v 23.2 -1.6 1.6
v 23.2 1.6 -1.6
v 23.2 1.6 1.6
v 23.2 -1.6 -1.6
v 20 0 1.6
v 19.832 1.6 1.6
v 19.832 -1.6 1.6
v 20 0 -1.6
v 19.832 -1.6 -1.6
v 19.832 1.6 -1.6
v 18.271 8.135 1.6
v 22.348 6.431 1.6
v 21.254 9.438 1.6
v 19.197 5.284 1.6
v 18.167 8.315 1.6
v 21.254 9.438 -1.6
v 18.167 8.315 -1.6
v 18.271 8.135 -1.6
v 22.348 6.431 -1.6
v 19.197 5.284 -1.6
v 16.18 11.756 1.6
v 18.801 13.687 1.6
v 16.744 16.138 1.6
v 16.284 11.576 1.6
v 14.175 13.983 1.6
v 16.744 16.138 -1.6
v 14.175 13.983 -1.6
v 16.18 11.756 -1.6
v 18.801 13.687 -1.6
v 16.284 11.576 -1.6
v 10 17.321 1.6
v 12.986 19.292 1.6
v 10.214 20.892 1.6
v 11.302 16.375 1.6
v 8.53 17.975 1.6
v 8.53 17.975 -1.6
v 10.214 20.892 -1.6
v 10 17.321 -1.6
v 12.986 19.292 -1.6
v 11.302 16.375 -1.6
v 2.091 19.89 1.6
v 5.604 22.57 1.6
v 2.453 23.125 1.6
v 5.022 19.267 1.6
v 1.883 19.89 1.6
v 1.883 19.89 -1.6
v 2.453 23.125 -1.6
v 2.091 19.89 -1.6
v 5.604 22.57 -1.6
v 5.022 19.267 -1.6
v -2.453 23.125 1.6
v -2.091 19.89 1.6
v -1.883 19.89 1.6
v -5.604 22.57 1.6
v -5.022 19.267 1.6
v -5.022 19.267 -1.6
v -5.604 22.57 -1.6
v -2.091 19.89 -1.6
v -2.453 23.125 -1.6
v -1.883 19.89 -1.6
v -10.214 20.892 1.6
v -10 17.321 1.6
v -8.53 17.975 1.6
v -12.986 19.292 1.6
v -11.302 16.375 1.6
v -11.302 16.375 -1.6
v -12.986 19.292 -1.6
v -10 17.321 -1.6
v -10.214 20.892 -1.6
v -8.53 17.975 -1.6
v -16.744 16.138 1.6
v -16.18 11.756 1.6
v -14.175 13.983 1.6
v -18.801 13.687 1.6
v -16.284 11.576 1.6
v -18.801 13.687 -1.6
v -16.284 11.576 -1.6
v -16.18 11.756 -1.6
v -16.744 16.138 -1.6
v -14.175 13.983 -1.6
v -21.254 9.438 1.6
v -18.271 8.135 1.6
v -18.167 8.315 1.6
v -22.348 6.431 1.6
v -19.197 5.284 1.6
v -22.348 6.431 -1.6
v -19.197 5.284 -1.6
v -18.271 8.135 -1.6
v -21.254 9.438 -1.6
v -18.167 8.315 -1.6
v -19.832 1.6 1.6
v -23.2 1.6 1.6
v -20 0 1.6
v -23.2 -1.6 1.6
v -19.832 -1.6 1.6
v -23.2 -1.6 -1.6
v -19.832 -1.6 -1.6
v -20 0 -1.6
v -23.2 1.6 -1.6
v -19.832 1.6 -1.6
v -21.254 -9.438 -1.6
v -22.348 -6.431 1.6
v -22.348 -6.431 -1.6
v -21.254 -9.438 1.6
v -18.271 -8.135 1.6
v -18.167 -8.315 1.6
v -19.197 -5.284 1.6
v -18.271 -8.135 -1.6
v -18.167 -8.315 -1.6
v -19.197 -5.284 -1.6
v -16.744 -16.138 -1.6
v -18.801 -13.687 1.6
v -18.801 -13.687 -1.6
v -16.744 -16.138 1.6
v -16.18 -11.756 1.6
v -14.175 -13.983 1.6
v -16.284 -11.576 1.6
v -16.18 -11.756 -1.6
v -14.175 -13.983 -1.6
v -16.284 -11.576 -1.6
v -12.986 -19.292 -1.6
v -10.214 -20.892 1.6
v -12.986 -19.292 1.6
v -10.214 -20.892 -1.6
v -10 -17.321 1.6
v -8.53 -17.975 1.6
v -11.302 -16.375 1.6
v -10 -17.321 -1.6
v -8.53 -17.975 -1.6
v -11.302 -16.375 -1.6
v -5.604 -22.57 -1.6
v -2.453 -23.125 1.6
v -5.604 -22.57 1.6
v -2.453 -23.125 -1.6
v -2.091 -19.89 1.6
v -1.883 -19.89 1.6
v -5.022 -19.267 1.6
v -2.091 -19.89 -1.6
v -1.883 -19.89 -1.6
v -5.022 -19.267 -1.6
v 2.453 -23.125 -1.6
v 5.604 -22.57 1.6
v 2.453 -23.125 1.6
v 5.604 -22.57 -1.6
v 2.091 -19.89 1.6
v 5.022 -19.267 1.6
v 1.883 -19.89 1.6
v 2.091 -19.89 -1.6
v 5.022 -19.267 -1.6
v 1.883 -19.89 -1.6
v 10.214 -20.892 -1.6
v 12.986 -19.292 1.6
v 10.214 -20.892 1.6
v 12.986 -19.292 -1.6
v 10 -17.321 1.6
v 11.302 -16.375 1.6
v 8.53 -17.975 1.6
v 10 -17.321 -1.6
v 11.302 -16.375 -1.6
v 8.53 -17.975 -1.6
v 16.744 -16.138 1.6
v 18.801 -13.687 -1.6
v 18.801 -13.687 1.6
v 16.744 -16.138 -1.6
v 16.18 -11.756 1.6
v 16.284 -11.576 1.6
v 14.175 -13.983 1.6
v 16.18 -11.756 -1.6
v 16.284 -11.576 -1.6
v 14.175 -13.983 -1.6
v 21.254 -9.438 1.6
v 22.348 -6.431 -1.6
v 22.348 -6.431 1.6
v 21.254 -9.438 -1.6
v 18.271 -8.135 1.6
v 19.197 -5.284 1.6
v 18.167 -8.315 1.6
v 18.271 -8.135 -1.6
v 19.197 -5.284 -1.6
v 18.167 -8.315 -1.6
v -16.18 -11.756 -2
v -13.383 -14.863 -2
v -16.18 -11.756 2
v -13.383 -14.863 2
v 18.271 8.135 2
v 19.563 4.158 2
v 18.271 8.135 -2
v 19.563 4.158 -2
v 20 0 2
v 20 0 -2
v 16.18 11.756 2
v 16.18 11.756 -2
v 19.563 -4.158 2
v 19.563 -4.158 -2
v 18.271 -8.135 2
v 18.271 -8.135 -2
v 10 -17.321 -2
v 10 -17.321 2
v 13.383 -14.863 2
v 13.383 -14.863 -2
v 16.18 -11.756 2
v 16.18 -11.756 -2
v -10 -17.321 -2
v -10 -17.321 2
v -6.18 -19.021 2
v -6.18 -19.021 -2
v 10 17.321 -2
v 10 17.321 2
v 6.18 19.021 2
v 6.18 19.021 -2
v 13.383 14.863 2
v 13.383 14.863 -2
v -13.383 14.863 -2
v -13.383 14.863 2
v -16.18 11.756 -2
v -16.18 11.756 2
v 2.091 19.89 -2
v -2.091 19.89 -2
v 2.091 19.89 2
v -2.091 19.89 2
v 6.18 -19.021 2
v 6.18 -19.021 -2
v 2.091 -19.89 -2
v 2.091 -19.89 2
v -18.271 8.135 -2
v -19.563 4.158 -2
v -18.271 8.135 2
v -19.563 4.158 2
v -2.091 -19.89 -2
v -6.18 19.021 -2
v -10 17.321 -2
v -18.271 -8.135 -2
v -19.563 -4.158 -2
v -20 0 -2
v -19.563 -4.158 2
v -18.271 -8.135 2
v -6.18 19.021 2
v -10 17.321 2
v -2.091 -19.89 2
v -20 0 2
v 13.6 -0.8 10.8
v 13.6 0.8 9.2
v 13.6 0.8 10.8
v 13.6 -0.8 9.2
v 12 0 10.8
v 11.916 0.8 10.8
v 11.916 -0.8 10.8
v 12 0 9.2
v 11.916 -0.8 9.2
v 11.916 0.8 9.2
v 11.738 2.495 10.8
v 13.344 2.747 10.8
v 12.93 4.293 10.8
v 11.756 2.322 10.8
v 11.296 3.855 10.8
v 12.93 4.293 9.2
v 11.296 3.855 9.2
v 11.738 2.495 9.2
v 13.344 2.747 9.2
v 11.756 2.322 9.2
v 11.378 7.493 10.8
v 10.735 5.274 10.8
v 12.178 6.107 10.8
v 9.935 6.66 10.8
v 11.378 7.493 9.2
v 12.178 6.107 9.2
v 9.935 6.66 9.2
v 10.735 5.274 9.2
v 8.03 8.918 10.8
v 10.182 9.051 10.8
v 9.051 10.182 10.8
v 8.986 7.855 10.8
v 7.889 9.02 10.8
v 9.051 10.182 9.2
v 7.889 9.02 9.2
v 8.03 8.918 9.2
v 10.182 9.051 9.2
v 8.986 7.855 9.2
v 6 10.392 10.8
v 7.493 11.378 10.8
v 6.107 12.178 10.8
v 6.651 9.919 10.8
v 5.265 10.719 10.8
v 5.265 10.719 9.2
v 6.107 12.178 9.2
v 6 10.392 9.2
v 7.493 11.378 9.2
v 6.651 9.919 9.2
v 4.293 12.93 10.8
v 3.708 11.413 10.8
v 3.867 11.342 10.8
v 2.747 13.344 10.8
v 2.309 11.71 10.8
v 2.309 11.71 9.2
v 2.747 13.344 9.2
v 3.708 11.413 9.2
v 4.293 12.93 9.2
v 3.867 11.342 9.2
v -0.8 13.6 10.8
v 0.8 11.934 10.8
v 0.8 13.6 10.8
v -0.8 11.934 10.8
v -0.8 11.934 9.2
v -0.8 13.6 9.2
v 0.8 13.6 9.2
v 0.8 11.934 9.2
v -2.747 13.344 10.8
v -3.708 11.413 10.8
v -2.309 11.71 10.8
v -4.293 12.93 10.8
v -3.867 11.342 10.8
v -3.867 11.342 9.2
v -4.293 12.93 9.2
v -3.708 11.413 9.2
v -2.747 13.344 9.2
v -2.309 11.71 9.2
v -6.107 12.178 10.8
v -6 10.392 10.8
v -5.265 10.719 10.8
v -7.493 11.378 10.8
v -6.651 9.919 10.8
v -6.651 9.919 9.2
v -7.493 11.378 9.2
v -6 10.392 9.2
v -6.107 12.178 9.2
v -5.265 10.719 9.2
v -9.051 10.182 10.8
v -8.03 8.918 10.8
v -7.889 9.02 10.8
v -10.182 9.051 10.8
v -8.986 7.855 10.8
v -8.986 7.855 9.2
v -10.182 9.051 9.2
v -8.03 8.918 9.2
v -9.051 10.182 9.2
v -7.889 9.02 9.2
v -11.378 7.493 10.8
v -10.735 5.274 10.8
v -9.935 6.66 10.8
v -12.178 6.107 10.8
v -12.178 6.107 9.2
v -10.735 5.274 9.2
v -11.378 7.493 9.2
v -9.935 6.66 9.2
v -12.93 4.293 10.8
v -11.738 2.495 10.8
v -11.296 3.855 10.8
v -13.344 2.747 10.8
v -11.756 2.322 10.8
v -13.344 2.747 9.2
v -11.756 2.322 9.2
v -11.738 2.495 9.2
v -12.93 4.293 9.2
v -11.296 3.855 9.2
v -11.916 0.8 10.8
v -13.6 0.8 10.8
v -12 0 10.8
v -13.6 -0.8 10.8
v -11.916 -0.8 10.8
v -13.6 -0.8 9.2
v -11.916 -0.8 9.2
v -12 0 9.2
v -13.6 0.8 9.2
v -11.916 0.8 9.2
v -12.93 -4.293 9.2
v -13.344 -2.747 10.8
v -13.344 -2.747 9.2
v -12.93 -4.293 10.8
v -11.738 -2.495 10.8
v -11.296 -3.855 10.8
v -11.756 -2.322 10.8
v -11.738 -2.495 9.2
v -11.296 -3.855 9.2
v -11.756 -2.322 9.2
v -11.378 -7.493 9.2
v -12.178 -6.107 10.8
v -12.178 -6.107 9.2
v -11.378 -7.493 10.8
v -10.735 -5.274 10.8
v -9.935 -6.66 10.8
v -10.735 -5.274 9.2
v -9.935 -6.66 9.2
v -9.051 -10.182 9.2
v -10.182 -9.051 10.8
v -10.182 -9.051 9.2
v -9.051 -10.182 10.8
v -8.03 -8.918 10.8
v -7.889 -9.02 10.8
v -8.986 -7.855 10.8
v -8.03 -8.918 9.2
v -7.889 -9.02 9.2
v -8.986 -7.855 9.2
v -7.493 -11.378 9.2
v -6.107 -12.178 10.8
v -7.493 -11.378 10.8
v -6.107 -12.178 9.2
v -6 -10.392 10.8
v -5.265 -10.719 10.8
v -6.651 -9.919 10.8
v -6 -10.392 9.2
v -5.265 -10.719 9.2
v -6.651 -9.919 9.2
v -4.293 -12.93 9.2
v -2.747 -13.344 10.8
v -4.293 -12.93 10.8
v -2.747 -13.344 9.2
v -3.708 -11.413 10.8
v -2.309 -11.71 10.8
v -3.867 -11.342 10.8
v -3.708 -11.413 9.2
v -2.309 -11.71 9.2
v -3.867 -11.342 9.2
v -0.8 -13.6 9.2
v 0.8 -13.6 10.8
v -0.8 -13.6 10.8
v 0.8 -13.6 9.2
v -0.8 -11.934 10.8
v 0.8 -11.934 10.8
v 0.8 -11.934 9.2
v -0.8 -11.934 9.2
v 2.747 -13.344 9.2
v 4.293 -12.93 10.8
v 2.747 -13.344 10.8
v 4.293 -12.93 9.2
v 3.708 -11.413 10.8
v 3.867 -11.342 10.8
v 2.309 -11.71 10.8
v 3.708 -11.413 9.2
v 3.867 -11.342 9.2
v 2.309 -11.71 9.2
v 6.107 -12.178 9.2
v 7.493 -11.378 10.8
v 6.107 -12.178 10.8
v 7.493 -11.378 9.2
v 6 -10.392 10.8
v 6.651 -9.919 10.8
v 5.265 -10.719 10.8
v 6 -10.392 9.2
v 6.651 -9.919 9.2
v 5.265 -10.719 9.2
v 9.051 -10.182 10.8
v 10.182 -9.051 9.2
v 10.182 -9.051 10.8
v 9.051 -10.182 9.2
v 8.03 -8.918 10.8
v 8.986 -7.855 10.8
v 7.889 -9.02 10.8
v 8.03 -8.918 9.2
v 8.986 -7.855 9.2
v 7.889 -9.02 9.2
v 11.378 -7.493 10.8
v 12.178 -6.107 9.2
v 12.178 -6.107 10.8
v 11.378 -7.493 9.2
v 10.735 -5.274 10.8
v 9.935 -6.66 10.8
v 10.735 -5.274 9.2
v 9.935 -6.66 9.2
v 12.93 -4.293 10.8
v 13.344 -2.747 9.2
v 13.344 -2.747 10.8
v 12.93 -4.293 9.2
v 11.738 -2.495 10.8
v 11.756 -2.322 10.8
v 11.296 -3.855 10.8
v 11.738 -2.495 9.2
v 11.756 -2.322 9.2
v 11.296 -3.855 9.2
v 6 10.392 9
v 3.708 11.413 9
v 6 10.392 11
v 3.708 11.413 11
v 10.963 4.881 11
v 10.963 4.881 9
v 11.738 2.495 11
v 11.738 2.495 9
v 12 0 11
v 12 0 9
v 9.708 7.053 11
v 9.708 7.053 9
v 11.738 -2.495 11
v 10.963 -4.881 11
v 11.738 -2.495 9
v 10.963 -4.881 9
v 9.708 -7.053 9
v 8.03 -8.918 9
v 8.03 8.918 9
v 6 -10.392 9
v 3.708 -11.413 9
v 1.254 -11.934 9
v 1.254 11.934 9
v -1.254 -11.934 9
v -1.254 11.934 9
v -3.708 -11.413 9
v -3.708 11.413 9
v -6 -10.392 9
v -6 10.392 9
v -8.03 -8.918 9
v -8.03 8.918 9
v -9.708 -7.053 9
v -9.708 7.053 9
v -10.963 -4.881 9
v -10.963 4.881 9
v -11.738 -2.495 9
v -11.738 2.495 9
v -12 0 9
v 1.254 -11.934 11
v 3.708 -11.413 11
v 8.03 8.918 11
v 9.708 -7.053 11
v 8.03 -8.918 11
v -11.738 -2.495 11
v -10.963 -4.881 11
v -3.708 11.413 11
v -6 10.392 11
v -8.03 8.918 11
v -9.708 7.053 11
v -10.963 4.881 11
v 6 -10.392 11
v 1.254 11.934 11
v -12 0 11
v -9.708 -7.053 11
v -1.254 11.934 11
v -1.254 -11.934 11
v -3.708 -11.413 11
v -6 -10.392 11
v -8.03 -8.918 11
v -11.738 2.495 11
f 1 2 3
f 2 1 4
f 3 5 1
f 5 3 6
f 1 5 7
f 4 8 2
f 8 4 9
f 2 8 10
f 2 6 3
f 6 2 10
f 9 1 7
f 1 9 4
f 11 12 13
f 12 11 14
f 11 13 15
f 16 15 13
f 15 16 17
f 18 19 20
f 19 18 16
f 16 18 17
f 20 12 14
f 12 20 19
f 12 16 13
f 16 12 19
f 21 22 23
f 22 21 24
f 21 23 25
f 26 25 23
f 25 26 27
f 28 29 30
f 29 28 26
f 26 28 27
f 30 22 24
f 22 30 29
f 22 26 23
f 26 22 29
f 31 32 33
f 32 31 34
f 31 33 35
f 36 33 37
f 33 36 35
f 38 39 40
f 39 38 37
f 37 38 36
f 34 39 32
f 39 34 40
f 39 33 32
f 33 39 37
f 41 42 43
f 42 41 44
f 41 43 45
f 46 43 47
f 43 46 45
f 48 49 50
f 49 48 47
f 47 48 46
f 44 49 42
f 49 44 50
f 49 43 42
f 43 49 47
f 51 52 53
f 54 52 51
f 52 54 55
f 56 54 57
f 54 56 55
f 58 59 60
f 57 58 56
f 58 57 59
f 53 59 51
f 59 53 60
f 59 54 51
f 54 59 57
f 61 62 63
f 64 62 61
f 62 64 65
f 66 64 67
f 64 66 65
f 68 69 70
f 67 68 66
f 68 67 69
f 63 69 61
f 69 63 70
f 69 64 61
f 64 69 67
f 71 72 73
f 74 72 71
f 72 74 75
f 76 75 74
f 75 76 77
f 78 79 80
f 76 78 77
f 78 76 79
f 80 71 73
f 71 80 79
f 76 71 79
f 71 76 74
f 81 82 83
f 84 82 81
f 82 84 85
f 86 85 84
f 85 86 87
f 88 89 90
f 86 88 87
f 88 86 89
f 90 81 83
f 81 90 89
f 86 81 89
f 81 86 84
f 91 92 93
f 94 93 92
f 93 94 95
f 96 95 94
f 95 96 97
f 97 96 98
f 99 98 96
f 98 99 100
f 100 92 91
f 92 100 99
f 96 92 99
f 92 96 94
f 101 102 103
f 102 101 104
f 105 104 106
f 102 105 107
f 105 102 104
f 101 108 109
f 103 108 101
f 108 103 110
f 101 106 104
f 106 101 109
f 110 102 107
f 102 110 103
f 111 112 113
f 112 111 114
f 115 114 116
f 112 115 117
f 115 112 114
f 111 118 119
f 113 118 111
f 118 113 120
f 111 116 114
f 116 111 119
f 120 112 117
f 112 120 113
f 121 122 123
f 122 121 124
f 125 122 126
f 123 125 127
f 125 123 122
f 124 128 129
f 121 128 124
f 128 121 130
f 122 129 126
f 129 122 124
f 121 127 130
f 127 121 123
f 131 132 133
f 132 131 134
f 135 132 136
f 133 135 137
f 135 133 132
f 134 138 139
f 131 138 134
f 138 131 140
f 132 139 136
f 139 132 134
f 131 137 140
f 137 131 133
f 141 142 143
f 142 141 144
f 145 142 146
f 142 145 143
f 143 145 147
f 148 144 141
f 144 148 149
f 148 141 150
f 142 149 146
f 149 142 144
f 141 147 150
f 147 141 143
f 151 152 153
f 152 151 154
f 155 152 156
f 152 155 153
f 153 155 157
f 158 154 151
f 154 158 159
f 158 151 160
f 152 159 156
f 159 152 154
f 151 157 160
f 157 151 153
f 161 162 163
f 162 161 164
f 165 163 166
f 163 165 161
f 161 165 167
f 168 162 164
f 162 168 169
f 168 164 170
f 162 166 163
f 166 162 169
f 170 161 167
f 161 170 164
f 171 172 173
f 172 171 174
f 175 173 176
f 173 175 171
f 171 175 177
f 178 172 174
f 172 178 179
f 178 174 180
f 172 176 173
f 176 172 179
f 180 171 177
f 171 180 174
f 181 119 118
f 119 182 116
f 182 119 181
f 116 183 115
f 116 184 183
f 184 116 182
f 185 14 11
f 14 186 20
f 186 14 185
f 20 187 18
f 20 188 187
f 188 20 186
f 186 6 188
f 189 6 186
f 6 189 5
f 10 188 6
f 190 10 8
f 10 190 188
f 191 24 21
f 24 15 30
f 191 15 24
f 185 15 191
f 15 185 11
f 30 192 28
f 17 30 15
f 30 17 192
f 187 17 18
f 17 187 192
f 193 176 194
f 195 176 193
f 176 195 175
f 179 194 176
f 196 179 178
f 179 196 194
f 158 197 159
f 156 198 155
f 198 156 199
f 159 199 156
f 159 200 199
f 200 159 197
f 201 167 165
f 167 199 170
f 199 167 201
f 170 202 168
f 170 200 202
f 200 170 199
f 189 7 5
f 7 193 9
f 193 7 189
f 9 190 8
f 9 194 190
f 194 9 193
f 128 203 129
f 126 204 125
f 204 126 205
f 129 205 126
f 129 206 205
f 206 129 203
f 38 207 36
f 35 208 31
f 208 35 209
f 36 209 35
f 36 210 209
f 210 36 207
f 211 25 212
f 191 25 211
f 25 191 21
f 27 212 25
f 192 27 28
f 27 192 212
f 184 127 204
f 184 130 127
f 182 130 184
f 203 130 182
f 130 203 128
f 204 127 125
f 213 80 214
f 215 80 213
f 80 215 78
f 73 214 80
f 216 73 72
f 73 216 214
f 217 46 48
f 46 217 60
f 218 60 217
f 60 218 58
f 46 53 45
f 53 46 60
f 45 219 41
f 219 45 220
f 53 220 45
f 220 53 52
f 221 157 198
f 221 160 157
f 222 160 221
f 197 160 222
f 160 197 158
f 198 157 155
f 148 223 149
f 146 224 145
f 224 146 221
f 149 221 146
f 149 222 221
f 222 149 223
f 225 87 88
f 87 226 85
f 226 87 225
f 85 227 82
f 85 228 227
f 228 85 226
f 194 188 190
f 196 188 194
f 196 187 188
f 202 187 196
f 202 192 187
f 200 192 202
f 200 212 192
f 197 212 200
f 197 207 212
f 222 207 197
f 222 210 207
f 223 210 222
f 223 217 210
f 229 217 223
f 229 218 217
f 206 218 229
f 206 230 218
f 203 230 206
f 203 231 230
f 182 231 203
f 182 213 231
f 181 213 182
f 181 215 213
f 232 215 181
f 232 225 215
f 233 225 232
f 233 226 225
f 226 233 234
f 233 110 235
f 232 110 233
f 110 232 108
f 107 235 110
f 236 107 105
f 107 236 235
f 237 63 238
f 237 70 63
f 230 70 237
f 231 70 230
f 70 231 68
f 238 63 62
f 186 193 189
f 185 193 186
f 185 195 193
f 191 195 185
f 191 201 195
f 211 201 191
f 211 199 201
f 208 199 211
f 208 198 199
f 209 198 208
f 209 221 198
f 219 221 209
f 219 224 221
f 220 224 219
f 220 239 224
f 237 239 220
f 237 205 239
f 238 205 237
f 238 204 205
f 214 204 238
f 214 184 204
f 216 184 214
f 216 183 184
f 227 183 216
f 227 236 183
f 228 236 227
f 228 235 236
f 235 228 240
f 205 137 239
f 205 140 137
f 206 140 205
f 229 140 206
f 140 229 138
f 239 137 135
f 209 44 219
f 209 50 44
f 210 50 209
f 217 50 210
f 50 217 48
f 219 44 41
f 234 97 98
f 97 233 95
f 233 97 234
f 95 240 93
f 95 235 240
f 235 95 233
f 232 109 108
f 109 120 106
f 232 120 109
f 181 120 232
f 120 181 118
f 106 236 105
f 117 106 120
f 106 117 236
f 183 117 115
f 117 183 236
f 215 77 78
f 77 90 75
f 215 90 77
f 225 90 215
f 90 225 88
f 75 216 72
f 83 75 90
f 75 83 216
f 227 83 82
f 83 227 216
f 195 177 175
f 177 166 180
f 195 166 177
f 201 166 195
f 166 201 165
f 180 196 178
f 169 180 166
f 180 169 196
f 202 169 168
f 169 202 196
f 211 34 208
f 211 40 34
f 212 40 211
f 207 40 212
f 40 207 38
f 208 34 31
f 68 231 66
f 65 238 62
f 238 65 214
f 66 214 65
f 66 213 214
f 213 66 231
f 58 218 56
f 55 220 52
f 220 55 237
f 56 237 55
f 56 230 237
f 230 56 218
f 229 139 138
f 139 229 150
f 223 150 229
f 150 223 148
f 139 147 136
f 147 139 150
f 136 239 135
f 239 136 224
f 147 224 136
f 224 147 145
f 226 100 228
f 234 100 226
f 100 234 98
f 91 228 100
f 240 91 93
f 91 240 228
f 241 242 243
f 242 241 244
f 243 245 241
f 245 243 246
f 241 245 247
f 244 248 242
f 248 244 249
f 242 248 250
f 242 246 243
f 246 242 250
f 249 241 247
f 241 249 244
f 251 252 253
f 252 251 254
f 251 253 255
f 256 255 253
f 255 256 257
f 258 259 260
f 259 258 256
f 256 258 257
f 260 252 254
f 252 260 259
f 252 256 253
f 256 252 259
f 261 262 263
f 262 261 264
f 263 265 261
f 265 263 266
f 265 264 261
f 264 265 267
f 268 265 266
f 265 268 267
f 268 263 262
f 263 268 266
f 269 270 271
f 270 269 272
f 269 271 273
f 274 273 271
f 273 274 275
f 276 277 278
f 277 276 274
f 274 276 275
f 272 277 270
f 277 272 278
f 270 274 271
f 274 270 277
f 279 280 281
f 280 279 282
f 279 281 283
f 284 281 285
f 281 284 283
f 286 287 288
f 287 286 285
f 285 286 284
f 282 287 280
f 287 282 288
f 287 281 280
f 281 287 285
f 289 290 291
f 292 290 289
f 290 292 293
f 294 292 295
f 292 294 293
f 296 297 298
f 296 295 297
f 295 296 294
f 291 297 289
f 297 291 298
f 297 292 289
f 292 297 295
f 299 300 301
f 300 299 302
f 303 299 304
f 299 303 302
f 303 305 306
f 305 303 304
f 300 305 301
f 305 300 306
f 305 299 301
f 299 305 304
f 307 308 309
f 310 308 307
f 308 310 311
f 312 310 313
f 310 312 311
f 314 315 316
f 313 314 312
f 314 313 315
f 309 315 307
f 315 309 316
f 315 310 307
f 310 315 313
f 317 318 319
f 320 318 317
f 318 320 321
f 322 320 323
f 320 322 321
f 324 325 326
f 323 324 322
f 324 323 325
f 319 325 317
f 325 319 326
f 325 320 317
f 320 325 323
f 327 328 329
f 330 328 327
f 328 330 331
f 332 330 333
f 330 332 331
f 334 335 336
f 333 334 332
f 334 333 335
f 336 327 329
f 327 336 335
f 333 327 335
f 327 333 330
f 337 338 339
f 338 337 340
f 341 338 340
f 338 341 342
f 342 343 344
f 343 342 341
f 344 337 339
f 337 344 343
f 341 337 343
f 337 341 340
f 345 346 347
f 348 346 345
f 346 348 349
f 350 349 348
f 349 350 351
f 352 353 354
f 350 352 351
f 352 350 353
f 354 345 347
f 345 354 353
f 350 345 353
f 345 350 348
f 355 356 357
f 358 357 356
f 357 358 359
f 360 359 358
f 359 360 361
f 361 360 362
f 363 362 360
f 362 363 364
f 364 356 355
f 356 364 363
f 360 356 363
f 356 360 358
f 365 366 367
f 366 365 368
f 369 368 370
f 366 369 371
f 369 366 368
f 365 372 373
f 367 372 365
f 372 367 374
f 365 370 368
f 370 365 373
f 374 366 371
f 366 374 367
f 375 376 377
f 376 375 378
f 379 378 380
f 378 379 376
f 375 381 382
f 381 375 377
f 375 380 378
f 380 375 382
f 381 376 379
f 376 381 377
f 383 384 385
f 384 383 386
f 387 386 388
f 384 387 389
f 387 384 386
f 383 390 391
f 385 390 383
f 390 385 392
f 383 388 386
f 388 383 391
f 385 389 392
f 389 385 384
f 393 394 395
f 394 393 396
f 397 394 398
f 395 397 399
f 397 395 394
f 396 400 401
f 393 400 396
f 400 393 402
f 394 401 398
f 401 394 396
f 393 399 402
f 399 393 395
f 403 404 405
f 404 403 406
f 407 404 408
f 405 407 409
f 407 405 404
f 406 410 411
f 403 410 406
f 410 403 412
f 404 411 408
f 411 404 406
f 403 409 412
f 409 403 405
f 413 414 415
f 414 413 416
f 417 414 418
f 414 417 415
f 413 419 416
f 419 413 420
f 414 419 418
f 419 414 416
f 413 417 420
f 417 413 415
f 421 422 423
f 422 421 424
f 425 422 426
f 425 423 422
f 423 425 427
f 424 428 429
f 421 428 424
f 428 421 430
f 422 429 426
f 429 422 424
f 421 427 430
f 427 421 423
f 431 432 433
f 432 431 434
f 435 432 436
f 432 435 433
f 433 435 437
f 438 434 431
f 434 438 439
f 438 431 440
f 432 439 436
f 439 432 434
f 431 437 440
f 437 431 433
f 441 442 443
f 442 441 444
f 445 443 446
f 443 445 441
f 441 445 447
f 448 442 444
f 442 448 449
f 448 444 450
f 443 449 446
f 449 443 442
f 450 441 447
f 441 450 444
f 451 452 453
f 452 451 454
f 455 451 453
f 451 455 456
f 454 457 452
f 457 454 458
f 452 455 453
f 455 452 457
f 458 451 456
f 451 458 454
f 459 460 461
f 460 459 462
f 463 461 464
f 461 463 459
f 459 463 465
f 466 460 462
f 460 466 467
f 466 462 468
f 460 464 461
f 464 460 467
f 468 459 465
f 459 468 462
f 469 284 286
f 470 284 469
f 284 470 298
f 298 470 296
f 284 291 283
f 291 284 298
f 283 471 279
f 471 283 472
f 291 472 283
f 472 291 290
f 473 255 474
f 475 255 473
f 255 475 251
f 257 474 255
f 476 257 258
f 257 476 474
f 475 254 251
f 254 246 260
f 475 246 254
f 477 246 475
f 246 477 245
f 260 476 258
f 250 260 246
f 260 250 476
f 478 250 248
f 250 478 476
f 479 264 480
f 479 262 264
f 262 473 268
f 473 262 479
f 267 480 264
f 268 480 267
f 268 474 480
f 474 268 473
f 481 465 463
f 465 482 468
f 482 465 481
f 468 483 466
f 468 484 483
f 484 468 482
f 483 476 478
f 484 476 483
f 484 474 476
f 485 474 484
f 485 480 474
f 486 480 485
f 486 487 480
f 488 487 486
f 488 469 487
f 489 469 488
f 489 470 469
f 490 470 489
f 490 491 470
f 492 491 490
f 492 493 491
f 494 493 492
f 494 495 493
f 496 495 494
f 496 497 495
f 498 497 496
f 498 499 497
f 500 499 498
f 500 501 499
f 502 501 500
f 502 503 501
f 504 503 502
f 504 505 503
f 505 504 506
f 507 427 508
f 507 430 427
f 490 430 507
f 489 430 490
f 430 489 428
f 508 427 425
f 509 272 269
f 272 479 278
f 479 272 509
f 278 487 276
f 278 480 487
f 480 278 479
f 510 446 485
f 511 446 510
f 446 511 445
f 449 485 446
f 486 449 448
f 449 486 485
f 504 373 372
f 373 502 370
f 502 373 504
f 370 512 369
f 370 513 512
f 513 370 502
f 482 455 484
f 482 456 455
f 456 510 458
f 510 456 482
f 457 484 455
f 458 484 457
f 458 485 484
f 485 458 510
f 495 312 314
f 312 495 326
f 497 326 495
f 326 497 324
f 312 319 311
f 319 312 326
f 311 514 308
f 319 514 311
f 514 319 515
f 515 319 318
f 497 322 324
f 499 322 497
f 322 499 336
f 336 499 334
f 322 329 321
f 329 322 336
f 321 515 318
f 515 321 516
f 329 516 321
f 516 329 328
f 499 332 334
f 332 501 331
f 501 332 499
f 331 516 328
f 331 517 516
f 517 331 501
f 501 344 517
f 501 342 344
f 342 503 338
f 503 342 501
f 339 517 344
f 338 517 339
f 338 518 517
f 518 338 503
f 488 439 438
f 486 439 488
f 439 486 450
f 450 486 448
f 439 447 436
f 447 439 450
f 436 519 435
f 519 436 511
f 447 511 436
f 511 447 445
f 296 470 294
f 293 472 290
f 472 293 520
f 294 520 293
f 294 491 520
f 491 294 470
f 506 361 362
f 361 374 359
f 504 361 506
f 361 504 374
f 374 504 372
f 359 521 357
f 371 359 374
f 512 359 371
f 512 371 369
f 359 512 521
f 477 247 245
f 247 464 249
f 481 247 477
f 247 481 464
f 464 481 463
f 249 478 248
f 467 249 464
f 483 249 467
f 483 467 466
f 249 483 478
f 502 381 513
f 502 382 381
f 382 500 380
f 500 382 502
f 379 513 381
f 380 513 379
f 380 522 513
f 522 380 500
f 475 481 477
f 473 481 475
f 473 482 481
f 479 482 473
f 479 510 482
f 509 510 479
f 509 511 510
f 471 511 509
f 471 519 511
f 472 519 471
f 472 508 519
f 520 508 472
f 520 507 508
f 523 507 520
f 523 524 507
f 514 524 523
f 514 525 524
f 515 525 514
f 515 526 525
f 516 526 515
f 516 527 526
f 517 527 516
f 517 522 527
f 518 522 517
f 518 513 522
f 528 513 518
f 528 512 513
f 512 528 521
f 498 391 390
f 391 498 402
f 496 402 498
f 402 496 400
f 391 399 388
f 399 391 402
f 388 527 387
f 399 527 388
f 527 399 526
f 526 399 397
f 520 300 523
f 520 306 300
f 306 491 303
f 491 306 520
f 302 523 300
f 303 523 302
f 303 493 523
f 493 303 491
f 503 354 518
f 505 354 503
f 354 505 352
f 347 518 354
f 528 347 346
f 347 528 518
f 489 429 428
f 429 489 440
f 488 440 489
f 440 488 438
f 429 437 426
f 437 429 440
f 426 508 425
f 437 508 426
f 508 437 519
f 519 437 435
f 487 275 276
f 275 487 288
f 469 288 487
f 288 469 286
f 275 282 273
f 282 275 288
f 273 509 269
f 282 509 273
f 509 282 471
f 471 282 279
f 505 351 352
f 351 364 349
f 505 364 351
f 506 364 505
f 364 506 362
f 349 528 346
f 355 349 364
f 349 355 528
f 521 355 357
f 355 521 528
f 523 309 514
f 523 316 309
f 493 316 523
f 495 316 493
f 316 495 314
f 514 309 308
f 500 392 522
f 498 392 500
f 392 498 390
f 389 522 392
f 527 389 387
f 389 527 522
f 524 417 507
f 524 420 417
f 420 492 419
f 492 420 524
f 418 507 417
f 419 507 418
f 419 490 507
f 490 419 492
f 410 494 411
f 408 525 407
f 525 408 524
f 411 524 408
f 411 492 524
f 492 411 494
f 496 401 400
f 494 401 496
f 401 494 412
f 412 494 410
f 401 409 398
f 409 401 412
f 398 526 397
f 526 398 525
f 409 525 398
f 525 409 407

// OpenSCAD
module gear(radius, thickness, teeth) {
    teeth_thickness = thickness * 0.8;
	cylinder(r=radius, h=thickness, center=true);
    for (t=[0:teeth]) {
        rotate([0, 0, t*360/teeth])
          translate([radius, 0, 0])
          cube([teeth_thickness*2, teeth_thickness, teeth_thickness], center=true);
    }
}

gear(20, 4, 18);
translate([0, 0, 10]) gear(12, 2, 24);
